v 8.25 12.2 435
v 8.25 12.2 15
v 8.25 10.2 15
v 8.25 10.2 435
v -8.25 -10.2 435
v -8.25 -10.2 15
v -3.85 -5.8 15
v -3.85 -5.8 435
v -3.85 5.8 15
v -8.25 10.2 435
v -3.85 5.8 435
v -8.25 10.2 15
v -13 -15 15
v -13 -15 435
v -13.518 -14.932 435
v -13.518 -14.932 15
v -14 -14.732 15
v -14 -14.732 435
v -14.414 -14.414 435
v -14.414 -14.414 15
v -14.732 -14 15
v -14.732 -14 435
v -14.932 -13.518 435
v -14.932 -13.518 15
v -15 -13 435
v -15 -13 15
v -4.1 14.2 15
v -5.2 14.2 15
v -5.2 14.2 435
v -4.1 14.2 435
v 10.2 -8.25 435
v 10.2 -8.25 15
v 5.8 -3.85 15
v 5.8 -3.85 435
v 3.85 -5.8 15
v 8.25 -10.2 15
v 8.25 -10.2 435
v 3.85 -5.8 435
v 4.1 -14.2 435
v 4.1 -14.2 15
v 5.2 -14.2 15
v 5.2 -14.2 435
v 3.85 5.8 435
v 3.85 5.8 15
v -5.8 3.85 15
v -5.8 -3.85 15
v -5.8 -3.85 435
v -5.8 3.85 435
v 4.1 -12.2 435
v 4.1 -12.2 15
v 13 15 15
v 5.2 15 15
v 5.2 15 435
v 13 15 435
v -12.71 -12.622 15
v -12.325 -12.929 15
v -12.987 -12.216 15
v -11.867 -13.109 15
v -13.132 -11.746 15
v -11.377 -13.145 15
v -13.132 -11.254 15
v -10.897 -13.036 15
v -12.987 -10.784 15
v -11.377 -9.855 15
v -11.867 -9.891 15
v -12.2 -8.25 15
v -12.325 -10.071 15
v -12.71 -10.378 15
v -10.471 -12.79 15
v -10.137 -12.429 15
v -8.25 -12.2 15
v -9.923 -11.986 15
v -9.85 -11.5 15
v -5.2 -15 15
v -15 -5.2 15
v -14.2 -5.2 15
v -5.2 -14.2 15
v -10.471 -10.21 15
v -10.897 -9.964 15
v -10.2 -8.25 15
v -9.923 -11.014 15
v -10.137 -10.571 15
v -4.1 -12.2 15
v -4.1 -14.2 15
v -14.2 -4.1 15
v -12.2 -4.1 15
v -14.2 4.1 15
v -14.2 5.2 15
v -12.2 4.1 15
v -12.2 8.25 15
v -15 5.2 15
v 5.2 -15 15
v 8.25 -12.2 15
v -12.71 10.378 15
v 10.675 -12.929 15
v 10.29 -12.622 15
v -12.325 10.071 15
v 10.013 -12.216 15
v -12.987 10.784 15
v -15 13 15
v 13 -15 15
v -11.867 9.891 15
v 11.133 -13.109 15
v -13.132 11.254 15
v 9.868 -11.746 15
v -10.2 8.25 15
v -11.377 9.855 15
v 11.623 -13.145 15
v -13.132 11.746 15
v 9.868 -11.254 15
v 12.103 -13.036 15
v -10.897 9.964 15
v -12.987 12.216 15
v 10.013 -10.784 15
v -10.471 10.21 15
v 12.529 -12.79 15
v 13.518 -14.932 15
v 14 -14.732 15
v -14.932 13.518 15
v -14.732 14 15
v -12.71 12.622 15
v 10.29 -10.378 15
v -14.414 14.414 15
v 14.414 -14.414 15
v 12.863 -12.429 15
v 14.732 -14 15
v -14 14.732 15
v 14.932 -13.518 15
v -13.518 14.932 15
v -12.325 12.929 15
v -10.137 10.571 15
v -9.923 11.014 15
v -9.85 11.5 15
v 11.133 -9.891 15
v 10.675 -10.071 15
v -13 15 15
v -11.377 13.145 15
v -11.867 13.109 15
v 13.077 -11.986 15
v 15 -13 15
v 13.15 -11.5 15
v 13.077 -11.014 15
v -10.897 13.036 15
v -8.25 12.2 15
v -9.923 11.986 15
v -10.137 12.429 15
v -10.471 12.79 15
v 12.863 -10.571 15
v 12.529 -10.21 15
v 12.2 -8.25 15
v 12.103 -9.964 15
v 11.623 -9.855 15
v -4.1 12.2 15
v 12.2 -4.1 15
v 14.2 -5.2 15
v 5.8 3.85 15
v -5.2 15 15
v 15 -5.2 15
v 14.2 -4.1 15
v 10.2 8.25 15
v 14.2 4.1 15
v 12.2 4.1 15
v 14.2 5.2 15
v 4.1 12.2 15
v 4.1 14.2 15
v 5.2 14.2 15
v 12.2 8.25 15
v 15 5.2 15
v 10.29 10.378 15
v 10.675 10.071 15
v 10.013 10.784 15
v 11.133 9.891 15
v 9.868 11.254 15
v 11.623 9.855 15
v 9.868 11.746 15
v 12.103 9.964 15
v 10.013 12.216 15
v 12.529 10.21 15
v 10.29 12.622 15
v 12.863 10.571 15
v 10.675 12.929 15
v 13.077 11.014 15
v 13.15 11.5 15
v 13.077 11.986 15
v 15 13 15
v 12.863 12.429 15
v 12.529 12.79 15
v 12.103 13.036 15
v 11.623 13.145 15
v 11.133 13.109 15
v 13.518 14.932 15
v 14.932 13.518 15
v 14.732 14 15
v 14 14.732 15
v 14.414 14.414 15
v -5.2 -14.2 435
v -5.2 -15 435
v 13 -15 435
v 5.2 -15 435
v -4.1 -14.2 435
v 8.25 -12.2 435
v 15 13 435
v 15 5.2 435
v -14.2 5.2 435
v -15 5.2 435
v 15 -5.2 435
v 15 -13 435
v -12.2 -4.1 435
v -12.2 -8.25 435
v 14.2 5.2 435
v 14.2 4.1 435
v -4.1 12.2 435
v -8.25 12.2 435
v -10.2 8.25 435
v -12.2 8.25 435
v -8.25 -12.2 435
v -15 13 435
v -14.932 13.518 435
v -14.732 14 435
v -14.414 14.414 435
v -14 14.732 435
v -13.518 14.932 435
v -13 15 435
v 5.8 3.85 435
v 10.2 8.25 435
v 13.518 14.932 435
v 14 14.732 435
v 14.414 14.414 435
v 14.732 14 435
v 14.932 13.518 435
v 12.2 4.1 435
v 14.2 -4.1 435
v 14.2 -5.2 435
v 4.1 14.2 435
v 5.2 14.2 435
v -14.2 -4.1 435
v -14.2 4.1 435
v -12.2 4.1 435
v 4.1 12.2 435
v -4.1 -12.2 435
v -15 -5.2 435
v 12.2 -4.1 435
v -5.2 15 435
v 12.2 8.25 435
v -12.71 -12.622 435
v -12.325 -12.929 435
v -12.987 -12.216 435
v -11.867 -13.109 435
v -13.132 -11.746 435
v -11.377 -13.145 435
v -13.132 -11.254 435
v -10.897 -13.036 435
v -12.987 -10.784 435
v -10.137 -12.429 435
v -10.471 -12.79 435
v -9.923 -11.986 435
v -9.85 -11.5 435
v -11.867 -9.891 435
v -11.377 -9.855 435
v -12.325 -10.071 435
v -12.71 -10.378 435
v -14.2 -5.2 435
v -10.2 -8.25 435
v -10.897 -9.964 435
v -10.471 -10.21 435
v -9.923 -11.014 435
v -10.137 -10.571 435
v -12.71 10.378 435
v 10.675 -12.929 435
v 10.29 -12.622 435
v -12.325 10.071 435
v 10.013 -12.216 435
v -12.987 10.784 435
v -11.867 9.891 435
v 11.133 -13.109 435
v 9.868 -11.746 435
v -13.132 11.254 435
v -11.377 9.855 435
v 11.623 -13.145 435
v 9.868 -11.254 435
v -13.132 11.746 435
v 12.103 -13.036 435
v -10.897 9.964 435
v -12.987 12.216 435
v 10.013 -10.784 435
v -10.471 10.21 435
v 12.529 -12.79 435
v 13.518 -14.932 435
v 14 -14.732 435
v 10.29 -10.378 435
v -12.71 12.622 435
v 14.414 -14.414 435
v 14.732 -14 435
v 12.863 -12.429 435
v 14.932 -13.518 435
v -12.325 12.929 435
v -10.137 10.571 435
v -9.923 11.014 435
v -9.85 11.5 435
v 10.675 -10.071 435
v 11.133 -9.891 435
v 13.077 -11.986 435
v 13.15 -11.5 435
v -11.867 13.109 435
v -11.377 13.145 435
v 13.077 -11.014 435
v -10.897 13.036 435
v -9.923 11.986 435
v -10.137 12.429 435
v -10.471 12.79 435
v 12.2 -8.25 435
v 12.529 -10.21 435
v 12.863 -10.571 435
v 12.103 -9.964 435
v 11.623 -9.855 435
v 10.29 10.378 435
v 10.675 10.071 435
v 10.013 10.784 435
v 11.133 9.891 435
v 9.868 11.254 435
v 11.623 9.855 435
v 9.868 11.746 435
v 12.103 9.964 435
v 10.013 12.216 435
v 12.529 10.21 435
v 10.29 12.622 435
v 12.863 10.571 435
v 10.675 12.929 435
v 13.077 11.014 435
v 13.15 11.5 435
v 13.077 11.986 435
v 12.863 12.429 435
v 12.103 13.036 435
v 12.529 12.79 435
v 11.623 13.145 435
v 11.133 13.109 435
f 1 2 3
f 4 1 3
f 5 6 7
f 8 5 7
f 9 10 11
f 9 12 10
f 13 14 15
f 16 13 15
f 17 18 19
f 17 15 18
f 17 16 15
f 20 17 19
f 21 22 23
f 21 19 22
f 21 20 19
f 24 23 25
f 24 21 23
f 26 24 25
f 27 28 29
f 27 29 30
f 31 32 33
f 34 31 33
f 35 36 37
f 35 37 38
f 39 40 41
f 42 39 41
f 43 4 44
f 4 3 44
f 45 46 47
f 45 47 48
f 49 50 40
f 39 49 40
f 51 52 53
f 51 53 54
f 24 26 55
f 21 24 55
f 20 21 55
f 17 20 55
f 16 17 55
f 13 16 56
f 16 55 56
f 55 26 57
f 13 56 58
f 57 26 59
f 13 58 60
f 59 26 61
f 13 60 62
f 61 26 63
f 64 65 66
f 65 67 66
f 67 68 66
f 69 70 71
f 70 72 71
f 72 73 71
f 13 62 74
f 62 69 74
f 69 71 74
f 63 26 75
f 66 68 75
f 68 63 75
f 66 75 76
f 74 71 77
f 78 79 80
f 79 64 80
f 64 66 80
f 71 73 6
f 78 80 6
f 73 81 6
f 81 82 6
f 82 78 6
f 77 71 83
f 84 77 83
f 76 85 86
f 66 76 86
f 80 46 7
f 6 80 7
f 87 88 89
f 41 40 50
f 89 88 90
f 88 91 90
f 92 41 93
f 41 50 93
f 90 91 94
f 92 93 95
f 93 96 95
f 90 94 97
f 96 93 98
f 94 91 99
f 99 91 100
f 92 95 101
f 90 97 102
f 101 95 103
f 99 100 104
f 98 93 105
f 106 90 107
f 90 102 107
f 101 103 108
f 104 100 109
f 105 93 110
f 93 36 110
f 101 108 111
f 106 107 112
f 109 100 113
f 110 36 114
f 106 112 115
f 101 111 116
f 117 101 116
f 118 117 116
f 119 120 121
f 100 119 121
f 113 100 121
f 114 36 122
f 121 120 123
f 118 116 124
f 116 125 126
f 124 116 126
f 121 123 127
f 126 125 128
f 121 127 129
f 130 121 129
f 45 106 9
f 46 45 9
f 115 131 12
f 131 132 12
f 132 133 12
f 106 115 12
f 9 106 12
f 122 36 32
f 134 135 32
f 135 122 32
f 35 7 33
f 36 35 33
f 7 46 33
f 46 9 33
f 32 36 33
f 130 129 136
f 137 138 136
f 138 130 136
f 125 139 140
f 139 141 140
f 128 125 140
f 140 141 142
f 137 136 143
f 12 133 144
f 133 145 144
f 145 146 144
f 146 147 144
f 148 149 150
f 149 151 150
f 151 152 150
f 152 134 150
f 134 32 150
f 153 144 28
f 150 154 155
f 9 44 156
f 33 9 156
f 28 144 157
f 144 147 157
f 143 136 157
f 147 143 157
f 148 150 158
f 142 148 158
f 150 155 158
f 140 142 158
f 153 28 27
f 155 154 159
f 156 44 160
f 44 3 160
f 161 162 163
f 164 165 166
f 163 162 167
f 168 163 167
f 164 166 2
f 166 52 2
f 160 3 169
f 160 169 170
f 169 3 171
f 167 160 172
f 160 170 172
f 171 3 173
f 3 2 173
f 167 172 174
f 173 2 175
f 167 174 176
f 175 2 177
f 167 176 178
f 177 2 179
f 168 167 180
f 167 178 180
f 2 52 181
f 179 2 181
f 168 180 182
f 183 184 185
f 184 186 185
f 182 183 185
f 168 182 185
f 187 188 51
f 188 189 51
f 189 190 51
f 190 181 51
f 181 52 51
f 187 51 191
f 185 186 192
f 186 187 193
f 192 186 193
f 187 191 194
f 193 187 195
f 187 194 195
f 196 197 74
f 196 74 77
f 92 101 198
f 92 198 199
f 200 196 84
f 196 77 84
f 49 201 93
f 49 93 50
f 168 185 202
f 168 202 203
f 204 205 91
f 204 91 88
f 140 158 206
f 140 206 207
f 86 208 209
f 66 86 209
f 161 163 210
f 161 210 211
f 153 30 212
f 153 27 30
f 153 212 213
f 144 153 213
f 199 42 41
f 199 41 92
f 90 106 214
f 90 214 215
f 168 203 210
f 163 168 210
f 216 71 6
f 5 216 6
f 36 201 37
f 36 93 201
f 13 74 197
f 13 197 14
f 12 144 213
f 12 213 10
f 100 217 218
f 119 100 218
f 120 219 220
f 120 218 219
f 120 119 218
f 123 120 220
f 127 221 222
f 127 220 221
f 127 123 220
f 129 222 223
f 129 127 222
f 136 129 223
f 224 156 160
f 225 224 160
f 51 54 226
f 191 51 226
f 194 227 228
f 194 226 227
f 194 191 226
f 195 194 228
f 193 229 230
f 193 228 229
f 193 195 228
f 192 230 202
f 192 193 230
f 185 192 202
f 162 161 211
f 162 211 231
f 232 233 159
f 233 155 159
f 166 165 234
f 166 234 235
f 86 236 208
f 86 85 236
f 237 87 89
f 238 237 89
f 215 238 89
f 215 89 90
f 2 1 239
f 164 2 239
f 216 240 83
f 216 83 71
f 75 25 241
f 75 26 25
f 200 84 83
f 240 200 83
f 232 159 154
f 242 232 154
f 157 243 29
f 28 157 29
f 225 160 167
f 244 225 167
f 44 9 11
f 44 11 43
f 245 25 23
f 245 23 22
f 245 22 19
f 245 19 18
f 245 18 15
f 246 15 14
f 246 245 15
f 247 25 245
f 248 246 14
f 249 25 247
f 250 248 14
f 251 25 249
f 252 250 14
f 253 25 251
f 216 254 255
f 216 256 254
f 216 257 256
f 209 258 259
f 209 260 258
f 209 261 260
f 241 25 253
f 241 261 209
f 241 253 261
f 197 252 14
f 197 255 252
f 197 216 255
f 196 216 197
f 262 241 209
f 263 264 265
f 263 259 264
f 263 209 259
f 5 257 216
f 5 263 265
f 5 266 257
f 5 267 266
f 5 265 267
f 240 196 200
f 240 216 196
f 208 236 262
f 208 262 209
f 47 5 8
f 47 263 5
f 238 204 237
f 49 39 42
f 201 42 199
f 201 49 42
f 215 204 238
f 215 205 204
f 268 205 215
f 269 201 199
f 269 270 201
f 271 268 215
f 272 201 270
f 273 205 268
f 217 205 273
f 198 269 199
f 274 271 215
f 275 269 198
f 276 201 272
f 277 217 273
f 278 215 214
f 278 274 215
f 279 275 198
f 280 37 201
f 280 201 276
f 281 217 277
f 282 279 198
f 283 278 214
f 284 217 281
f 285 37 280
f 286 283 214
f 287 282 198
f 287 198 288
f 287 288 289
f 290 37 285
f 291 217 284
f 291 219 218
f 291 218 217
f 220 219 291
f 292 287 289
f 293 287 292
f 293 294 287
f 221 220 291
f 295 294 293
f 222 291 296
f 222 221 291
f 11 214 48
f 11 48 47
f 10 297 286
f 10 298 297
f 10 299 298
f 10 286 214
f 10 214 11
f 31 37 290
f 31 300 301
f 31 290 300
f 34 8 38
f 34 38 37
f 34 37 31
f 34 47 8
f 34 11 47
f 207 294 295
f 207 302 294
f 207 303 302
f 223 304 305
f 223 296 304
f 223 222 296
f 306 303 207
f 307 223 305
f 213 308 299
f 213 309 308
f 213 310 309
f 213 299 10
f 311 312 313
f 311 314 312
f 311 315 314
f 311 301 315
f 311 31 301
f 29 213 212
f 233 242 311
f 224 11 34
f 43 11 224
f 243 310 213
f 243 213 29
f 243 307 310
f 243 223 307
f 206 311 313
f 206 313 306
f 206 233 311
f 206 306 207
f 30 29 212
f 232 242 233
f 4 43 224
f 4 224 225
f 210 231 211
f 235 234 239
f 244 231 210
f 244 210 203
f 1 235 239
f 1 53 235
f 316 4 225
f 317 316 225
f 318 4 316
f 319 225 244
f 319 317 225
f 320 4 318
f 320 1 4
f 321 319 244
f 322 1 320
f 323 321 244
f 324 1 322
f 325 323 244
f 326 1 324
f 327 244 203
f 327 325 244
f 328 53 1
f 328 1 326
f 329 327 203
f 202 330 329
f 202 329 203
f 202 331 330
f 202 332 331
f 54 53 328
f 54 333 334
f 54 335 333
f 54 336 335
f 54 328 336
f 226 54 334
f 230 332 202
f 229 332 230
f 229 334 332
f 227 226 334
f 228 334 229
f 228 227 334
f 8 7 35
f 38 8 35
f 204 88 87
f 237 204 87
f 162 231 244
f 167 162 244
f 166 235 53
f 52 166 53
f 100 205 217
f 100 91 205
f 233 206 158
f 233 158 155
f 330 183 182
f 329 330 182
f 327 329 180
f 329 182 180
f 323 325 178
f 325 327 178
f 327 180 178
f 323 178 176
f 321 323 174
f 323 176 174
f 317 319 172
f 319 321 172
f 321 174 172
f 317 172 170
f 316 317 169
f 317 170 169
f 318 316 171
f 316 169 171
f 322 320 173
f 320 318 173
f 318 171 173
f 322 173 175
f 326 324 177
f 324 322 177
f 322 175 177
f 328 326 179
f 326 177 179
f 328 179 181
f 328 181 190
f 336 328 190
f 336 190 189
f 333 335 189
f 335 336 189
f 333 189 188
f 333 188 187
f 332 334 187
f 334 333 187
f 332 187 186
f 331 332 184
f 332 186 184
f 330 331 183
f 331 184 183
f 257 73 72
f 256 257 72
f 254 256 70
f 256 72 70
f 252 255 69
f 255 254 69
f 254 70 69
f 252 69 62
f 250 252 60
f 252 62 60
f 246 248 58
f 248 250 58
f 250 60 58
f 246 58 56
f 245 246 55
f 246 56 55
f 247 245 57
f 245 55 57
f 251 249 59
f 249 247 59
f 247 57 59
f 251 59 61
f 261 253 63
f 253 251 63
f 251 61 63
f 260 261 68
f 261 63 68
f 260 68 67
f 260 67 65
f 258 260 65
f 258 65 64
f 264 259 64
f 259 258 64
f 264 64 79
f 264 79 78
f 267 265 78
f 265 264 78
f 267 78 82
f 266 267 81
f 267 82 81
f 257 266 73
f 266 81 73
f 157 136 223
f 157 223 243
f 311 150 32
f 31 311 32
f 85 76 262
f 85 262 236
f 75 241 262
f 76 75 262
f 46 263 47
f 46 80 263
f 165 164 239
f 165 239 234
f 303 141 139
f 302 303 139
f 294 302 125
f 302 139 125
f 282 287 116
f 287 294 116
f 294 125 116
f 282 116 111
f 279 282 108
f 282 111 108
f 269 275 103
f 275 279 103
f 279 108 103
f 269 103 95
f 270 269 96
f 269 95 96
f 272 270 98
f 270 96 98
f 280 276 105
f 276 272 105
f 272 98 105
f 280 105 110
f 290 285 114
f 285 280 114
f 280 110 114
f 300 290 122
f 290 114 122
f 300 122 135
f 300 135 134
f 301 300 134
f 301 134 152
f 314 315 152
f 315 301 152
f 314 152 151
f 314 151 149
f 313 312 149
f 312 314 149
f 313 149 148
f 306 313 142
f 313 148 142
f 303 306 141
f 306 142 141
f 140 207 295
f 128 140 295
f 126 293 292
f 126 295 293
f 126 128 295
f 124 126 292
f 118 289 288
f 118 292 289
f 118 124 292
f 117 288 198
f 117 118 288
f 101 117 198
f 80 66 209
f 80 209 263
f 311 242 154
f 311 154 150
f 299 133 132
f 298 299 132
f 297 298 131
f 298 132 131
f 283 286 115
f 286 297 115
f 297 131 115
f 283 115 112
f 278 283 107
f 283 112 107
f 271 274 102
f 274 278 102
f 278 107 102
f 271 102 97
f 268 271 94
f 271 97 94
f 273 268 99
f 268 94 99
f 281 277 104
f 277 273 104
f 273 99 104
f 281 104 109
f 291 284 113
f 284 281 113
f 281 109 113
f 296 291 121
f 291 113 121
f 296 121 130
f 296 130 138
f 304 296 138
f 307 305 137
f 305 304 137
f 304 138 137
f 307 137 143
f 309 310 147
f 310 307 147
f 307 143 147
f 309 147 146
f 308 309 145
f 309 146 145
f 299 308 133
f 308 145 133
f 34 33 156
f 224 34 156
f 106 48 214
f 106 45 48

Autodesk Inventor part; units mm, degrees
ref_plane "Work Plane3" through (0, 0, 250) normal (0, 0, 1) x (1, 0, 0)
sketch "Sketch2" plane through (0, 0, 250) normal (0, 0, 1) x (1, 0, 0)
  circle A0 centre (0, 0) radius 3.4
  dimension "d51" = 6.8
extrude "Extrusion2" [suppressed]
ref_plane "Start Plane" through (0, 0, 15) normal (0, 0, 1) x (1, 0, 0)
ref_plane "End Plane" through (0, 0, 435) normal (0, 0, 1) x (1, 0, 0)
sketch "Sketch" plane through (0, 0, 0) normal (0, 0, 1) x (1, 0, 0)
  line L0 (-13, 15) -> (13, 15)
  line L1 (15, 13) -> (15, -13)
  line L2 (-15, 15) -> (15, -15) construction
  line L3 (15, 15) -> (-15, -15) construction
  line L4 (-5.2, 15) -> (-5.2, 14.2)
  line L5 (-5.2, 14.2) -> (-4.1, 14.2)
  line L6 (-4.1, 14.2) -> (-4.1, 12.2)
  line L7 (-4.1, 12.2) -> (-8.25, 12.2)
  line L8 (-8.25, 12.2) -> (-8.25, 10.2)
  line L9 (-8.25, 10.2) -> (-3.85, 5.8)
  line L10 (-3.85, 5.8) -> (3.85, 5.8)
  line L11 (8.25, 12.2) -> (4.1, 12.2)
  line L12 (4.1, 12.2) -> (4.1, 14.2)
  line L13 (4.1, 14.2) -> (5.2, 14.2)
  line L14 (5.2, 14.2) -> (5.2, 15)
  line L15 (8.25, 12.2) -> (8.25, 10.2)
  line L16 (8.25, 10.2) -> (3.85, 5.8)
  line L17 (-5.8, 0) -> (5.8, 0)
  line L18 (-5.2, -15) -> (-5.2, -14.2)
  line L19 (-5.2, -14.2) -> (-4.1, -14.2)
  line L20 (-4.1, -14.2) -> (-4.1, -12.2)
  line L21 (-4.1, -12.2) -> (-8.25, -12.2)
  line L22 (-8.25, -12.2) -> (-8.25, -10.2)
  line L23 (-8.25, -10.2) -> (-3.85, -5.8)
  line L24 (-3.85, -5.8) -> (3.85, -5.8)
  line L25 (8.25, -12.2) -> (4.1, -12.2)
  line L26 (4.1, -12.2) -> (4.1, -14.2)
  line L27 (4.1, -14.2) -> (5.2, -14.2)
  line L28 (5.2, -14.2) -> (5.2, -15)
  line L29 (8.25, -12.2) -> (8.25, -10.2)
  line L30 (8.25, -10.2) -> (3.85, -5.8)
  line L31 (0, 5.8) -> (0, -5.8)
  line L32 (15, 5.2) -> (14.2, 5.2)
  line L33 (14.2, 5.2) -> (14.2, 4.1)
  line L34 (14.2, 4.1) -> (12.2, 4.1)
  line L35 (12.2, 4.1) -> (12.2, 8.25)
  line L36 (15, -5.2) -> (14.2, -5.2)
  line L37 (14.2, -5.2) -> (14.2, -4.1)
  line L38 (14.2, -4.1) -> (12.2, -4.1)
  line L39 (12.2, -4.1) -> (12.2, -8.25)
  line L40 (12.2, -8.25) -> (10.2, -8.25)
  line L41 (10.2, -8.25) -> (5.8, -3.85)
  line L42 (5.8, -3.85) -> (5.8, 3.85)
  line L43 (5.8, 3.85) -> (10.2, 8.25)
  line L44 (10.2, 8.25) -> (12.2, 8.25)
  line L45 (-15, 5.2) -> (-14.2, 5.2)
  line L46 (-14.2, 5.2) -> (-14.2, 4.1)
  line L47 (-14.2, 4.1) -> (-12.2, 4.1)
  line L48 (-12.2, 4.1) -> (-12.2, 8.25)
  line L49 (-15, -5.2) -> (-14.2, -5.2)
  line L50 (-14.2, -5.2) -> (-14.2, -4.1)
  line L51 (-14.2, -4.1) -> (-12.2, -4.1)
  line L52 (-12.2, -4.1) -> (-12.2, -8.25)
  line L53 (-12.2, -8.25) -> (-10.2, -8.25)
  line L54 (-10.2, -8.25) -> (-5.8, -3.85)
  line L55 (-5.8, -3.85) -> (-5.8, 3.85)
  line L56 (-5.8, 3.85) -> (-10.2, 8.25)
  line L57 (-10.2, 8.25) -> (-12.2, 8.25)
  circle A0 centre (11.5, 11.5) radius 1.65
  circle A1 centre (11.5, -11.5) radius 1.65
  circle A2 centre (-11.5, 11.5) radius 1.65
  circle A3 centre (-11.5, -11.5) radius 1.65
  line L58 (-15, -13) -> (-15, -5.2)
  line L59 (-15, 5.2) -> (-15, 13)
  line L60 (13, -15) -> (5.2, -15)
  line L61 (-5.2, -15) -> (-13, -15)
  arc A4 (-13, 15) -> (-15, 13) centre (-13, 13) ccw
  arc A5 (15, 13) -> (13, 15) centre (13, 13) ccw
  arc A6 (13, -15) -> (15, -13) centre (13, -13) ccw
  arc A7 (-15, -13) -> (-13, -15) centre (-13, -13) ccw
  point P0 (0, 0)
  point P1 (0, 0)
  dimension "d2" = 8.2
  dimension "d3" = 4.1
  dimension "d4" = 10.4
  dimension "d5" = 5.2
  dimension "d8" = 9.2
  dimension "d11" = 16.5
  dimension "d12" = 8.25
  dimension "d14" = 0.8
  dimension "d15" = 2
  dimension "d16" = 2
  dimension "d34" = 0.8
  dimension "d35" = 10.4
  dimension "d36" = 5.2
  dimension "d37" = 8.2
  dimension "d38" = 4.1
  dimension "d39" = 2
  dimension "d40" = 16.5
  dimension "d41" = 8.25
  dimension "d42" = 2
  dimension "d43" = 9.2
  dimension "d44" = 23
  dimension "d45" = 11.5
  dimension "d46" = 23
  dimension "d47" = 11.5
  dimension "d48" = 3.3
  dimension "d55" = 2
extrude "Body" add sketch "Sketch" along normal up to surface (420 mm away) from surface at 15 contours L0 L4 L5 L6 L7 L8 L9 L10 L31 L17 L55 L56 L57 L48 L47 L46 L45 L59 A4 | L0 A5 L1 L32 L33 L34 L35 L44 L43 L42 L17 L31 L10 L16 L15 L11 L12 L13 L14 | L1 A6 L60 L28 L27 L26 L25 L29 L30 L24 L31 L17 L42 L41 L40 L39 L38 L37 L36 | L31 L24 L23 L22 L21 L20 L19 L18 L61 A7 L58 L49 L50 L51 L52 L53 L54 L55 L17
sketch "Sketch3" plane through (0, 0, 0) normal (0, 0, 1) x (1, 0, 0)
  line L0 (0, 0) -> (10, 0)
ref_plane "Work Plane4" through (0, 0, 0) normal (0, -1, 0) x (1, 0, 0)
sketch "Sketch4" plane through (0, 0, 0) normal (0, -1, 0) x (1, 0, 0)
  line L0 (-2, 15) -> (12, 15)
  line L1 (-2, 435) -> (12, 435)
  dimension "d61" = 420
ref_plane "Work Plane5" through (-185, 5.2, 435) normal (0, 0, 1) x (1, 0, 0)
split "Split1" plane through (-185, 5.2, 435) removes the side toward (0, 0, 1)
ref_plane "Work Plane6" through (265, 5.2, 15) normal (0, 0, -1) x (-1, 0, 0)
split "Split2" plane through (265, 5.2, 15) removes the side toward (0, 0, -1)
equation "\"d3\" = 0.5 * d2"
equation "\"d5\" = 0.5 * d4"
equation "\"d12\" = 0.5 * d11"
equation "\"d36\" = 0.5 * d35"
equation "\"d38\" = 0.5 * d37"
equation "\"d41\" = 0.5 * d40"
equation "\"d45\" = 0.5 * d44"
equation "\"d47\" = 0.5 * d46"
equation "\"G_OFFSET_START\" = -15"
equation "\"G_OFFSET_END\" = -15"
equation "\"d56\" = -G_OFFSET_START"
equation "\"G_L\" = d61"
properties part number "420 mm" material "Aluminum 6061"
